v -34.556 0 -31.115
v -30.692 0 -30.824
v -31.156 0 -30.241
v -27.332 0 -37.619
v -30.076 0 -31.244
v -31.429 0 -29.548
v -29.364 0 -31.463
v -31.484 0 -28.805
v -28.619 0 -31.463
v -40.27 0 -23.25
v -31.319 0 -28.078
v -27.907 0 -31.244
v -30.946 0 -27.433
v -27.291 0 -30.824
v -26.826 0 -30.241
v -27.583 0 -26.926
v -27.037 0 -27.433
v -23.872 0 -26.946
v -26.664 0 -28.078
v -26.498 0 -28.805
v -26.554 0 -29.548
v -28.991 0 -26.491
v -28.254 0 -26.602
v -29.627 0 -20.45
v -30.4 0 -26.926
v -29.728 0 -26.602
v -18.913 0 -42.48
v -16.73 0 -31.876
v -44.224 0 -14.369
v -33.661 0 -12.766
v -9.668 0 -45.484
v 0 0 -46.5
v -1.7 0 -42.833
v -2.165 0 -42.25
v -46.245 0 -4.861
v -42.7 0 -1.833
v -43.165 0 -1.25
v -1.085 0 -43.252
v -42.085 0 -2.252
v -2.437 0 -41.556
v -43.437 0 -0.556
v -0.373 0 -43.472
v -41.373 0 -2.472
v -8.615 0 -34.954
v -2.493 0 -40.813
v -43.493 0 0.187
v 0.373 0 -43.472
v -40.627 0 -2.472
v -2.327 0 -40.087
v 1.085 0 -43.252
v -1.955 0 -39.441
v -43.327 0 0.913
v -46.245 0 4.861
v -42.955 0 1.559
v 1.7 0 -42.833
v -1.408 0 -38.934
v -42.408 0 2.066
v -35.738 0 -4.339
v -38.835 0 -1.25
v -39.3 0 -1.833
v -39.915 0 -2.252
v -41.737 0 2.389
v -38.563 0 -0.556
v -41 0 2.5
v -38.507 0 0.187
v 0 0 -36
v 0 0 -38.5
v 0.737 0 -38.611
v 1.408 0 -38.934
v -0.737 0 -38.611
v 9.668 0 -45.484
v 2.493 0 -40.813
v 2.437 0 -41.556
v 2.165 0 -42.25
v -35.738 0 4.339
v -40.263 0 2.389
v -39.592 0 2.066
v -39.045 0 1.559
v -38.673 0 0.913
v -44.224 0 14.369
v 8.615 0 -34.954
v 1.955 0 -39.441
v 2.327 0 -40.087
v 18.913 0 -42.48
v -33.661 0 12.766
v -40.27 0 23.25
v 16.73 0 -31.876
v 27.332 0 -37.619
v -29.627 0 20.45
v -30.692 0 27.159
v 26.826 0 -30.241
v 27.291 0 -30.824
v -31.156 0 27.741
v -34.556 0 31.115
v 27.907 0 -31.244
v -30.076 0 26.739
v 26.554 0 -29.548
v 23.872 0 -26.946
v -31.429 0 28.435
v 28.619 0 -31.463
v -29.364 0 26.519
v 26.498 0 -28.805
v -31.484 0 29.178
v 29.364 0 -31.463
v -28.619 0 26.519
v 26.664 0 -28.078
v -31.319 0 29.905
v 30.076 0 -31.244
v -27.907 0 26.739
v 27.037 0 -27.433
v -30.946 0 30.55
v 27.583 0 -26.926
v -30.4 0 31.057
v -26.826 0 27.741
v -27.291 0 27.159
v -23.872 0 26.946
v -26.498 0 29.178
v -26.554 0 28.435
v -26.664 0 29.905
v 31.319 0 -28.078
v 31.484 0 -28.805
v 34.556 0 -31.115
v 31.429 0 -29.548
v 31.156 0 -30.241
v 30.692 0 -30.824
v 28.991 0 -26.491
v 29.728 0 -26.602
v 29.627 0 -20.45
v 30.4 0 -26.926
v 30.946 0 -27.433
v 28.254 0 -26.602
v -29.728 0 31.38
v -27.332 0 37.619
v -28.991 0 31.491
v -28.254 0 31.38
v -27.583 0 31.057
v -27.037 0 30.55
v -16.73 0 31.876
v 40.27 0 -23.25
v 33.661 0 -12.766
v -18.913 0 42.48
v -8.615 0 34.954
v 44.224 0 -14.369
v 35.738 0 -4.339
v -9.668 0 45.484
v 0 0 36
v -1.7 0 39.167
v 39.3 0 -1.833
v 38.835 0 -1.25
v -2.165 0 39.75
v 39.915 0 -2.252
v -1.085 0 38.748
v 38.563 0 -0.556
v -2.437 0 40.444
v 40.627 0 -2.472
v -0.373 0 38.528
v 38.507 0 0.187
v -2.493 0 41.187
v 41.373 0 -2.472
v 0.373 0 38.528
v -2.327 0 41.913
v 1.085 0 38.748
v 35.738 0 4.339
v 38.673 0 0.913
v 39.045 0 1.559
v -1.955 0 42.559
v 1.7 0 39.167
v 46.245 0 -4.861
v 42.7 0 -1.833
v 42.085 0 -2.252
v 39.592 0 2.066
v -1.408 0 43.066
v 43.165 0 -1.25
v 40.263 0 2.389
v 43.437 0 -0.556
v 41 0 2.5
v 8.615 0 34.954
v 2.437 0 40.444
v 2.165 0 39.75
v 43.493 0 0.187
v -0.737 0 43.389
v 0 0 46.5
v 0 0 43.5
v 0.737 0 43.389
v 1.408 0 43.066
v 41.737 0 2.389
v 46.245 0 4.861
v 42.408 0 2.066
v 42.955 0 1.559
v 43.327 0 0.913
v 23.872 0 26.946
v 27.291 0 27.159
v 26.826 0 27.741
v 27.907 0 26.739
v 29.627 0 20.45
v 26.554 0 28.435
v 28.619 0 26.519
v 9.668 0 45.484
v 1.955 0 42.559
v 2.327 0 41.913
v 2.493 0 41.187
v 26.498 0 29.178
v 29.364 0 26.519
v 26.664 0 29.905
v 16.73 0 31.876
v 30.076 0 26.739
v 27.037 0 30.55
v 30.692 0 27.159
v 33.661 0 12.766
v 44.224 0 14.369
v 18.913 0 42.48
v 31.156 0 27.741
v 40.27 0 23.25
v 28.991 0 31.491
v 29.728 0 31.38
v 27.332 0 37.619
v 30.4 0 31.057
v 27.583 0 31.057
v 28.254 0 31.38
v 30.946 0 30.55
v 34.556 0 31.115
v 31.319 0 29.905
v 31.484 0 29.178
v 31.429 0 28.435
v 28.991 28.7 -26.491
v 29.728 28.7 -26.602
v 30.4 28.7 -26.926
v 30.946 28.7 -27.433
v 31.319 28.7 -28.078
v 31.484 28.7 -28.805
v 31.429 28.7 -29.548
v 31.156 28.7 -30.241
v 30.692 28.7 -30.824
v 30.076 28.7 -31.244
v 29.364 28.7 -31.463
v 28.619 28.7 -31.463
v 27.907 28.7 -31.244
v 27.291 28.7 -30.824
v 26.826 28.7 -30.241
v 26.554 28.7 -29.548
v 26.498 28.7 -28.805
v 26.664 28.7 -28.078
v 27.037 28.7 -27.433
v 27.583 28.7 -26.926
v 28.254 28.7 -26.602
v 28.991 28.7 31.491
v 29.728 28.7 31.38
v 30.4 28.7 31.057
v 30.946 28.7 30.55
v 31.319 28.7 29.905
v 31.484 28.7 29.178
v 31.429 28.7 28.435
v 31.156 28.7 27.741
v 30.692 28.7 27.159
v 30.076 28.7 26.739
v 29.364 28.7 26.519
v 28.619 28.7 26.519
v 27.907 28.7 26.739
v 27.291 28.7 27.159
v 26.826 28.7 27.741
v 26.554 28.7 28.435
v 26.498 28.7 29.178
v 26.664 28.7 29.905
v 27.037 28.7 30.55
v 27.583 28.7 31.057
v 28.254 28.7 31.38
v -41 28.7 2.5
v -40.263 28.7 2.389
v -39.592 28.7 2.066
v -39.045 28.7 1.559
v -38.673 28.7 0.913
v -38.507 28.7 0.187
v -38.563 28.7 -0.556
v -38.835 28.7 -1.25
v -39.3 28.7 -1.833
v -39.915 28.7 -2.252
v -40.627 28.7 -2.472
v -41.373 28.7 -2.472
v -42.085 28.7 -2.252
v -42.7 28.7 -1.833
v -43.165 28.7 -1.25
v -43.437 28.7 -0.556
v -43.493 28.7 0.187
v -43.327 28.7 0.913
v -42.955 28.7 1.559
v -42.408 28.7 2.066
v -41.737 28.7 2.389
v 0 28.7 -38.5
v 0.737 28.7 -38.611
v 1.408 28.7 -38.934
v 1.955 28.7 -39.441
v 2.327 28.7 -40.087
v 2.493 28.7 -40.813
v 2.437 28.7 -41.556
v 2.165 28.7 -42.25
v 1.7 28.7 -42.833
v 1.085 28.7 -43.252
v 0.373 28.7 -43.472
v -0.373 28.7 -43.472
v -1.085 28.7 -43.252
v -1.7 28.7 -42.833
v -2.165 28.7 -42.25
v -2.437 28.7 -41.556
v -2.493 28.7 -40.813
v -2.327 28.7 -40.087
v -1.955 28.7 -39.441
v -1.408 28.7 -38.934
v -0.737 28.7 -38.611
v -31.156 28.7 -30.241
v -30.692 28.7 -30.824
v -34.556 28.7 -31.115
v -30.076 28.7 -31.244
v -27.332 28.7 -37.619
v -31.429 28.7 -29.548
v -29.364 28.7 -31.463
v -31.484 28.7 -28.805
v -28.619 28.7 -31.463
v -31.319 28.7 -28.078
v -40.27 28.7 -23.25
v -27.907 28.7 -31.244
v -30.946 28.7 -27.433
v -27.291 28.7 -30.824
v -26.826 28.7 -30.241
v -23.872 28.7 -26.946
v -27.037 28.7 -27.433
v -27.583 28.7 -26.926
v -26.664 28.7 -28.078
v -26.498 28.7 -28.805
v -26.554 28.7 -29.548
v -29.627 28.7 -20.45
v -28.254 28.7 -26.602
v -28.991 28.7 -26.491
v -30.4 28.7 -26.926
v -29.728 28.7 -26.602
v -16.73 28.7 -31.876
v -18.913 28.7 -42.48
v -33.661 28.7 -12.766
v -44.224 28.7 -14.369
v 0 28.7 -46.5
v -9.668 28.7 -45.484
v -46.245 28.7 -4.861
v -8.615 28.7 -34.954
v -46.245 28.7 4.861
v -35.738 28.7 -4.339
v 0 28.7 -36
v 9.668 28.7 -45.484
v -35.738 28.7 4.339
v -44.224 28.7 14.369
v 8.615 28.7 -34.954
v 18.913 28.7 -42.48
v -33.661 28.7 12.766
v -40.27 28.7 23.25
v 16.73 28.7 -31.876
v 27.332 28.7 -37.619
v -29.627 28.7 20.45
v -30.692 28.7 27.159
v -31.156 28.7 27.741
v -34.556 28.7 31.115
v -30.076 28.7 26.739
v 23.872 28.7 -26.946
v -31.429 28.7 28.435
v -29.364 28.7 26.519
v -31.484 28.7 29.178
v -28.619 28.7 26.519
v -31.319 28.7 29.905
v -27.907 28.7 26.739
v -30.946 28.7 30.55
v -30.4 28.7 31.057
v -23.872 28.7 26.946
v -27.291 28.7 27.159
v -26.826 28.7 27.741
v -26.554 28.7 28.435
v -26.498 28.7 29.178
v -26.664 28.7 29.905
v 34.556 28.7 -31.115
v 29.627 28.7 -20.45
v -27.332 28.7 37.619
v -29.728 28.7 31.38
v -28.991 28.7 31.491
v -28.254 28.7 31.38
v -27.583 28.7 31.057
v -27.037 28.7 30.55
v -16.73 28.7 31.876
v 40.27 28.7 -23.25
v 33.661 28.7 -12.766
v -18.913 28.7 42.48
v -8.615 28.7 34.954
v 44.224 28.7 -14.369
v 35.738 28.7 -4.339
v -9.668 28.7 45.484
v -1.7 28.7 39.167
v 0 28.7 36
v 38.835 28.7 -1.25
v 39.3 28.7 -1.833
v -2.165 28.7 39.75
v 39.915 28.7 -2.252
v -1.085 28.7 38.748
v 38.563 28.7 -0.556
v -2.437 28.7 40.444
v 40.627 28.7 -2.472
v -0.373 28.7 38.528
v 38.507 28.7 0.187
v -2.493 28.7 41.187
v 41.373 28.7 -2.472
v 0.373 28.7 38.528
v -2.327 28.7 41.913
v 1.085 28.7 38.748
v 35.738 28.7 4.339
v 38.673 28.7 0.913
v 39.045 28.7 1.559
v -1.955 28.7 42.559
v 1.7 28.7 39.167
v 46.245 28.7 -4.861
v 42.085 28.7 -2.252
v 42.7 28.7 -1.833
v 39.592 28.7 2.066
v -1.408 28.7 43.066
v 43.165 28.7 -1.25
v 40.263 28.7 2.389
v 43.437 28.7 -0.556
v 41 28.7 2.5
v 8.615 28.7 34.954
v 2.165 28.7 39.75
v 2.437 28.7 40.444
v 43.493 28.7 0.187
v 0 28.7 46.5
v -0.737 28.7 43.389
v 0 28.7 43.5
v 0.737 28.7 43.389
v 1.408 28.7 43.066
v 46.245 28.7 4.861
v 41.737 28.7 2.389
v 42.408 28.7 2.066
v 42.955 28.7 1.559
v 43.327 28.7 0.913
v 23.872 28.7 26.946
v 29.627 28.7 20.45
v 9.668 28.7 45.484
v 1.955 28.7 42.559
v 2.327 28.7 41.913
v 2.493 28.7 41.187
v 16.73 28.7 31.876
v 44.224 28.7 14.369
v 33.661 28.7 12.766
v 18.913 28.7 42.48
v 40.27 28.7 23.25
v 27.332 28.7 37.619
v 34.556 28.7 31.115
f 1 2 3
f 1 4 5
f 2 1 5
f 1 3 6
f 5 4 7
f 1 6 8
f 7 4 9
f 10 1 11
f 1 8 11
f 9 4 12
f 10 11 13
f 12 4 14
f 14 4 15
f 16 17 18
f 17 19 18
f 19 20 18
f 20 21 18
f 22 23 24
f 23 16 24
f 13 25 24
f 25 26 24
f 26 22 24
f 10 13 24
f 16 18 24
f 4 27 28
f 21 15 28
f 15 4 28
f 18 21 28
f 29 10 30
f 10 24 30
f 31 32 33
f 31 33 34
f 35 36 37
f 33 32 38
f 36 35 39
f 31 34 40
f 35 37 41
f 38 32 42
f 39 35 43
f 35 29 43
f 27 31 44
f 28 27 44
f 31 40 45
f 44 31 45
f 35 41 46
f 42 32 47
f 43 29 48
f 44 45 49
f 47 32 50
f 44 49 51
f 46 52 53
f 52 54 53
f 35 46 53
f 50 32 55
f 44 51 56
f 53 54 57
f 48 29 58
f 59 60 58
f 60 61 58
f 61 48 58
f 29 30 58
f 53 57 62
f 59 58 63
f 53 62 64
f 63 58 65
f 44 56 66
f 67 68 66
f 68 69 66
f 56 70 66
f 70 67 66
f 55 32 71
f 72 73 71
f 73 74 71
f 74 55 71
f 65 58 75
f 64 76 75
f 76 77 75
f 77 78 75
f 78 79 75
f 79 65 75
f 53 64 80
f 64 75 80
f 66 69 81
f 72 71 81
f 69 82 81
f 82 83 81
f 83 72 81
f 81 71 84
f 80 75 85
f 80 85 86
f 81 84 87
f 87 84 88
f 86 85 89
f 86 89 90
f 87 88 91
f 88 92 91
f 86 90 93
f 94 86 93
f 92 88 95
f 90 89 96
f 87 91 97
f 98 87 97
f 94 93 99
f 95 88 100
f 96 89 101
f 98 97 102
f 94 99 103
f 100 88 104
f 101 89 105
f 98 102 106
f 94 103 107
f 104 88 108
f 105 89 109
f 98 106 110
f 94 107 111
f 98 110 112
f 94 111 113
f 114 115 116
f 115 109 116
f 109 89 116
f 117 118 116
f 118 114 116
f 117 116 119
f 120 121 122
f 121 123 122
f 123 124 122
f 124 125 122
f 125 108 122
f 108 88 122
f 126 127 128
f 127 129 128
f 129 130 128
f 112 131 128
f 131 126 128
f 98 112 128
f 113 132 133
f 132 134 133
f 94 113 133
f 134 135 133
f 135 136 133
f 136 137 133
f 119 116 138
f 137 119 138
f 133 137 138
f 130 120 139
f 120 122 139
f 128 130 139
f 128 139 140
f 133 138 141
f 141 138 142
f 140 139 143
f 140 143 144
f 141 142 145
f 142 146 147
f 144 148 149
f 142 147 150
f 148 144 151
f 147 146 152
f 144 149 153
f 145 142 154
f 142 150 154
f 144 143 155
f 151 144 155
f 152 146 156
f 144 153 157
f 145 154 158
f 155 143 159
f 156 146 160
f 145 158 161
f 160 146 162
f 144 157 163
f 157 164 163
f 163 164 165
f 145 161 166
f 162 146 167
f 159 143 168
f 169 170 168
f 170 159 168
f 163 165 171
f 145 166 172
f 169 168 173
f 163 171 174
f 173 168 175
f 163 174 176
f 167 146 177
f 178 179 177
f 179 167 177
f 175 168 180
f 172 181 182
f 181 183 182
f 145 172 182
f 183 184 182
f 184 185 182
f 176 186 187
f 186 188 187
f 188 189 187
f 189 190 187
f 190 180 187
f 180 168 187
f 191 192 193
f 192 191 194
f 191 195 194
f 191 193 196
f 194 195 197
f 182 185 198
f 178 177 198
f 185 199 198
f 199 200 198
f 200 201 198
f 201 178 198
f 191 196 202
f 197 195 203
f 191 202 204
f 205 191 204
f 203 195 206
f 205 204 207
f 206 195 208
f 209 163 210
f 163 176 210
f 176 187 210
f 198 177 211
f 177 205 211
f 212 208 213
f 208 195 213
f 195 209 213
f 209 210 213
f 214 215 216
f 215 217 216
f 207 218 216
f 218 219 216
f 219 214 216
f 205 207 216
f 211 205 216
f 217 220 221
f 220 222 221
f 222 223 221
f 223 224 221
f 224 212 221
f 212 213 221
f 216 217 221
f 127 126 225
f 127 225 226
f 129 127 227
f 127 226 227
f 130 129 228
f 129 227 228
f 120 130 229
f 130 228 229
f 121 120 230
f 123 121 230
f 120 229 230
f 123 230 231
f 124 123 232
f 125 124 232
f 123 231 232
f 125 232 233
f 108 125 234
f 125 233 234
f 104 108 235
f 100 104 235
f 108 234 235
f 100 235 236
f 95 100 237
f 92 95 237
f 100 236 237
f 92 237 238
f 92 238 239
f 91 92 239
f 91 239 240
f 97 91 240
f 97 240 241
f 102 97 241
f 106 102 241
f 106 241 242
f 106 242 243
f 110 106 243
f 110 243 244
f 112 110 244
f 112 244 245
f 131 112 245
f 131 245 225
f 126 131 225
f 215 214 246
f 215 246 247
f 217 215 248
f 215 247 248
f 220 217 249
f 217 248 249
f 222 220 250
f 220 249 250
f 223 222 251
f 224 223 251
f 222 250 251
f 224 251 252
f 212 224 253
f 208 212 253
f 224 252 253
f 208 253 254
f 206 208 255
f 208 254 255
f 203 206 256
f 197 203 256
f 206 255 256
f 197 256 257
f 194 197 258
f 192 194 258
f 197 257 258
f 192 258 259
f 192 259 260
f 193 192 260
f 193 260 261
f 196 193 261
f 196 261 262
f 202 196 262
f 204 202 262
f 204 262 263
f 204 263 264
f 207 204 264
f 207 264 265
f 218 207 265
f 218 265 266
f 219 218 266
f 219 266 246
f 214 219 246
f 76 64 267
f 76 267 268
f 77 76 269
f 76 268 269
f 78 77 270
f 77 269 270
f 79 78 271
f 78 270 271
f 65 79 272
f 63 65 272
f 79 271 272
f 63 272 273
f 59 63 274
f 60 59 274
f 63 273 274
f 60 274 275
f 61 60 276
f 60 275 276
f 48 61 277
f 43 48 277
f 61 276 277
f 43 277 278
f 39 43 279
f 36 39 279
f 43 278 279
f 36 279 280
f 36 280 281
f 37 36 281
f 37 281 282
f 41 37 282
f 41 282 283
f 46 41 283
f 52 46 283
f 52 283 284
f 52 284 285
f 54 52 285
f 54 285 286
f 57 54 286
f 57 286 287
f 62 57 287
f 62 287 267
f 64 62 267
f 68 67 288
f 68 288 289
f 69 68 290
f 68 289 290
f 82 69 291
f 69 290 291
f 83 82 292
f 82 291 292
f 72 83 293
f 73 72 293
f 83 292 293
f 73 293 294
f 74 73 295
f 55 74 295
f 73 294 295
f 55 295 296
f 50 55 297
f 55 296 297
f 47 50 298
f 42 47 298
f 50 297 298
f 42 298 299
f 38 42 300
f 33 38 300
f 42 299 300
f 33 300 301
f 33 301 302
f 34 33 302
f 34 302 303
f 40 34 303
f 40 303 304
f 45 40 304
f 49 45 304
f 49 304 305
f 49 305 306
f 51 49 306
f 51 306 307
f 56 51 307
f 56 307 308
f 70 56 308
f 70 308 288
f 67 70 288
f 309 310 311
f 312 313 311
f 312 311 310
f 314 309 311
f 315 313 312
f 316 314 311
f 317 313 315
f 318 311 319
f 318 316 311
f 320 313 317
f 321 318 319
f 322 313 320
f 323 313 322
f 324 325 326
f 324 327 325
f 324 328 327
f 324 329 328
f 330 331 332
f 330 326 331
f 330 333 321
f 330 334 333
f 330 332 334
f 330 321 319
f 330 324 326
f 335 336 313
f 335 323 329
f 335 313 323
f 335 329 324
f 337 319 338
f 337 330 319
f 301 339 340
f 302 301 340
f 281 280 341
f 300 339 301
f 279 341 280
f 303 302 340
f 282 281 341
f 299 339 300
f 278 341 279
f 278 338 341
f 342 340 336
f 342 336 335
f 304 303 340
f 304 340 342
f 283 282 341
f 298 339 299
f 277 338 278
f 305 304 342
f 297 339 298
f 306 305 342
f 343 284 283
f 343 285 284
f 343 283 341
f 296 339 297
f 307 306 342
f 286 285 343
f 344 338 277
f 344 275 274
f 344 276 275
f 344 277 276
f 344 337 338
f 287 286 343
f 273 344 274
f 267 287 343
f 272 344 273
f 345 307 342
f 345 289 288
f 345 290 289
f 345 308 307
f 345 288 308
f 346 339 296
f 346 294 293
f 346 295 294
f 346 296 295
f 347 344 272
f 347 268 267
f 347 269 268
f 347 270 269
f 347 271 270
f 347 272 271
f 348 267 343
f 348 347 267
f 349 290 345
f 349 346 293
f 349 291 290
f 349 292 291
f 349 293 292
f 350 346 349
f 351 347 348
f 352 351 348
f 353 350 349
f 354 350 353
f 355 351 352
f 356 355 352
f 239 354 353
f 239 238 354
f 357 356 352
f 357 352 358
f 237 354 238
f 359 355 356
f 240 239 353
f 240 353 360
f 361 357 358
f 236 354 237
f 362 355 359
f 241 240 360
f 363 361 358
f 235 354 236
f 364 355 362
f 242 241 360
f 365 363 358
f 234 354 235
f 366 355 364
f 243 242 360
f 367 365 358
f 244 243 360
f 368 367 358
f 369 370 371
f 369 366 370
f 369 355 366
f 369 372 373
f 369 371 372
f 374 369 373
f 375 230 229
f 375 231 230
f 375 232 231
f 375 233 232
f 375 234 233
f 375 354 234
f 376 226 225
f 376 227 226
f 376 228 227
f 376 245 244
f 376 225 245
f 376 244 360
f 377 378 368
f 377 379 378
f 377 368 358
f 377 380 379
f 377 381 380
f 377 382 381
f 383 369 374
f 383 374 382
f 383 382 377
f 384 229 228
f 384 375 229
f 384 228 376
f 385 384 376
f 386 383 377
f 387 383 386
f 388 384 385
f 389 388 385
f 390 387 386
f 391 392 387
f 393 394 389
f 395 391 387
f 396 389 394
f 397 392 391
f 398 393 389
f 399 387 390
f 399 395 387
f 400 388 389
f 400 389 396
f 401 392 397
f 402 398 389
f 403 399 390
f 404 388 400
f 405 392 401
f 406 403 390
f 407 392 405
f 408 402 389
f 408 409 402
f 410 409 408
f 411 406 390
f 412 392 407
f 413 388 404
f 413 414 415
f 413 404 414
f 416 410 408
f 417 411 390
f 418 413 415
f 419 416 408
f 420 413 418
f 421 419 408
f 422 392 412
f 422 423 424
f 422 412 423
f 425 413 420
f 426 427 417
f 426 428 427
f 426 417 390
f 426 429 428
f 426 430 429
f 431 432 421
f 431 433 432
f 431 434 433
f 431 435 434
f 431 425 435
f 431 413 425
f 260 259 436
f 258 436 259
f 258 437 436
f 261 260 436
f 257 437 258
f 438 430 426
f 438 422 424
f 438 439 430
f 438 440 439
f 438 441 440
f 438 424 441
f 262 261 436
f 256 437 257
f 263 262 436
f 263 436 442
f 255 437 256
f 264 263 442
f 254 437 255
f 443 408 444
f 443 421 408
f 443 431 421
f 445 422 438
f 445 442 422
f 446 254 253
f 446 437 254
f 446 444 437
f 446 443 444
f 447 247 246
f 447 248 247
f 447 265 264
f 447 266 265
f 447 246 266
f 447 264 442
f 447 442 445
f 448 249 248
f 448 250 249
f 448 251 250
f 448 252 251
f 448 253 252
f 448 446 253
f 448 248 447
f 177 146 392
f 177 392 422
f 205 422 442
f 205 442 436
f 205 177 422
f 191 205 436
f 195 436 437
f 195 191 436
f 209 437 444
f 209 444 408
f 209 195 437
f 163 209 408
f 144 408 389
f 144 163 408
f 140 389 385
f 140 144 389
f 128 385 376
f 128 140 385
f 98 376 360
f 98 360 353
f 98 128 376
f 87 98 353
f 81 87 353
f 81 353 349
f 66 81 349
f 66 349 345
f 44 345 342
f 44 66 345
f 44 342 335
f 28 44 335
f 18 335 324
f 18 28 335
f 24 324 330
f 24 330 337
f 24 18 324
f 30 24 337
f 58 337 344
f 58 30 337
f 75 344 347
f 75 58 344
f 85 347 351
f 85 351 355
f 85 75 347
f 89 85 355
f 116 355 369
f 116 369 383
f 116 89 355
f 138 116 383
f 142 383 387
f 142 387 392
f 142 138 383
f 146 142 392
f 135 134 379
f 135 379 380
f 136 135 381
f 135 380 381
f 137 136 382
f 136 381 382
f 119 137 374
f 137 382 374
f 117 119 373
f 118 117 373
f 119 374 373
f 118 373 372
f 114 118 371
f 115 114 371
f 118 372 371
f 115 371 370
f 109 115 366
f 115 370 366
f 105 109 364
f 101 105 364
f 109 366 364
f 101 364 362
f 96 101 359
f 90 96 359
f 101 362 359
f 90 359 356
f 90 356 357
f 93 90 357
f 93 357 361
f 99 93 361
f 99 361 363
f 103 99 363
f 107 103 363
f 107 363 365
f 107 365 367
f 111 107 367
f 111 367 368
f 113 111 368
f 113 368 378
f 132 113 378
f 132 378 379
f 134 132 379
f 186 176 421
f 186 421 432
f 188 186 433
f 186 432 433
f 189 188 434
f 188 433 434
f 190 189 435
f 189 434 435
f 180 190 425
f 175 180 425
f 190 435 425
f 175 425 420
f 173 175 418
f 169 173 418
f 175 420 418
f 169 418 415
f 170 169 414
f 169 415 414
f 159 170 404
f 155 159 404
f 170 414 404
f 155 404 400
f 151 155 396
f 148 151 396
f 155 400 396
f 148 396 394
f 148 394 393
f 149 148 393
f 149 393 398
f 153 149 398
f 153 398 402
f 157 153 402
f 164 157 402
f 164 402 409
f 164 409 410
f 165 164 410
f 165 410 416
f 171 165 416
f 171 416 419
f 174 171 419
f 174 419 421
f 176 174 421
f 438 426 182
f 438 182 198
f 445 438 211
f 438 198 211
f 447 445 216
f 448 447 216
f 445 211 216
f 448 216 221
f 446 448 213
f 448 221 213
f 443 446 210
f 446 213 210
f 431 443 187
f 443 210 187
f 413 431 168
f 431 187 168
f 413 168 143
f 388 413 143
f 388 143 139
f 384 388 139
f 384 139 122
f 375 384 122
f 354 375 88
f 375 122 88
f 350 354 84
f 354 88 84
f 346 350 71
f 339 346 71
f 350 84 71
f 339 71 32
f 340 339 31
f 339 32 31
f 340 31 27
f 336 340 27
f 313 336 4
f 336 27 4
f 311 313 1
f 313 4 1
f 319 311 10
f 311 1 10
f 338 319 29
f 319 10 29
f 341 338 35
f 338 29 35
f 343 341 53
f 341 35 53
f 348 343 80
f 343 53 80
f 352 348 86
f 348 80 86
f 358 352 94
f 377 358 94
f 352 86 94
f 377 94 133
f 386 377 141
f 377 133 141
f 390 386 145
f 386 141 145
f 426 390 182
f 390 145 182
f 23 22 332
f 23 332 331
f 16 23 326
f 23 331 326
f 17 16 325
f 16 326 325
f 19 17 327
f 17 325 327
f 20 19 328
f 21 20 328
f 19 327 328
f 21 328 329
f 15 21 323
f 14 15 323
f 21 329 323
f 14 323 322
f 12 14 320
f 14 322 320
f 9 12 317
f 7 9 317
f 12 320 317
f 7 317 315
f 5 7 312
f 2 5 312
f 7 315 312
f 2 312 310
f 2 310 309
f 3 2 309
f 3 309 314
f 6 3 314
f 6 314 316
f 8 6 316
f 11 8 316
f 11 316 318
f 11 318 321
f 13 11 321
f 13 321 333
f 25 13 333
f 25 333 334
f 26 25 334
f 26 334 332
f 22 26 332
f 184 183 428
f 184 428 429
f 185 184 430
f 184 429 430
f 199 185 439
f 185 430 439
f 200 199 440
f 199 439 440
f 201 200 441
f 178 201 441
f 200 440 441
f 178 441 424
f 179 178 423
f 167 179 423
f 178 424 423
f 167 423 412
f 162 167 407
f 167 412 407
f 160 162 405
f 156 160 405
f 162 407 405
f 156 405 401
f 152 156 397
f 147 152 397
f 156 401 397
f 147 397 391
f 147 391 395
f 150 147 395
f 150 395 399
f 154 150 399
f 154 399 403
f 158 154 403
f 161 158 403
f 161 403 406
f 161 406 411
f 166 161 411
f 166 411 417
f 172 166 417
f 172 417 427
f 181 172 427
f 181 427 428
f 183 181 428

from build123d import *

# Parameters (mm, degrees)
SKETCH1_R           = 46.5
SKETCH1_R_2         = 36
BOSS_EXTRUDE1_DEPTH = 28.7
SKETCH2_R           = 2.5
CUT_EXTRUDE1_DEPTH  = 72.750888496


with BuildPart() as part:
    # Sketch1 → Boss-Extrude1 (new body)
    with BuildSketch(Plane(origin=(0, 0, 0), x_dir=(1, 0, 0), z_dir=(0, 1, 0))):
        with Locations(Location((0, 0, 0), (0, 0, 270))):
            Circle(SKETCH1_R)
        with Locations(Location((0, 0, 0), (0, 0, 270))):
            Circle(SKETCH1_R_2, mode=Mode.SUBTRACT)
    extrude(amount=BOSS_EXTRUDE1_DEPTH)

    # Sketch2 → Cut-Extrude1 (cut, through all)
    with BuildSketch(Plane(origin=(0, 28.7, 0), x_dir=(1, 0, 0), z_dir=(0, 1, 0))):
        with Locations(Location((0, 41, 0), (0, 0, 270))):
            Circle(SKETCH2_R)
        with Locations(Location((28.991378029, 28.991378029, 0), (0, 0, 270))):
            Circle(SKETCH2_R)
        with Locations(Location((41, 0, 0), (0, 0, 270))):
            Circle(SKETCH2_R)
        with Locations(Location((28.991378029, -28.991378029, 0), (0, 0, 270))):
            Circle(SKETCH2_R)
        with Locations(Location((0, -41, 0), (0, 0, 270))):
            Circle(SKETCH2_R)
        with Locations(Location((-28.991378029, -28.991378029, 0), (0, 0, 270))):
            Circle(SKETCH2_R)
        with Locations(Location((-41, 0, 0), (0, 0, 270))):
            Circle(SKETCH2_R)
        with Locations(Location((-28.991378029, 28.991378029, 0), (0, 0, 270))):
            Circle(SKETCH2_R)
    extrude(amount=-CUT_EXTRUDE1_DEPTH, mode=Mode.SUBTRACT)


solid = part.part
